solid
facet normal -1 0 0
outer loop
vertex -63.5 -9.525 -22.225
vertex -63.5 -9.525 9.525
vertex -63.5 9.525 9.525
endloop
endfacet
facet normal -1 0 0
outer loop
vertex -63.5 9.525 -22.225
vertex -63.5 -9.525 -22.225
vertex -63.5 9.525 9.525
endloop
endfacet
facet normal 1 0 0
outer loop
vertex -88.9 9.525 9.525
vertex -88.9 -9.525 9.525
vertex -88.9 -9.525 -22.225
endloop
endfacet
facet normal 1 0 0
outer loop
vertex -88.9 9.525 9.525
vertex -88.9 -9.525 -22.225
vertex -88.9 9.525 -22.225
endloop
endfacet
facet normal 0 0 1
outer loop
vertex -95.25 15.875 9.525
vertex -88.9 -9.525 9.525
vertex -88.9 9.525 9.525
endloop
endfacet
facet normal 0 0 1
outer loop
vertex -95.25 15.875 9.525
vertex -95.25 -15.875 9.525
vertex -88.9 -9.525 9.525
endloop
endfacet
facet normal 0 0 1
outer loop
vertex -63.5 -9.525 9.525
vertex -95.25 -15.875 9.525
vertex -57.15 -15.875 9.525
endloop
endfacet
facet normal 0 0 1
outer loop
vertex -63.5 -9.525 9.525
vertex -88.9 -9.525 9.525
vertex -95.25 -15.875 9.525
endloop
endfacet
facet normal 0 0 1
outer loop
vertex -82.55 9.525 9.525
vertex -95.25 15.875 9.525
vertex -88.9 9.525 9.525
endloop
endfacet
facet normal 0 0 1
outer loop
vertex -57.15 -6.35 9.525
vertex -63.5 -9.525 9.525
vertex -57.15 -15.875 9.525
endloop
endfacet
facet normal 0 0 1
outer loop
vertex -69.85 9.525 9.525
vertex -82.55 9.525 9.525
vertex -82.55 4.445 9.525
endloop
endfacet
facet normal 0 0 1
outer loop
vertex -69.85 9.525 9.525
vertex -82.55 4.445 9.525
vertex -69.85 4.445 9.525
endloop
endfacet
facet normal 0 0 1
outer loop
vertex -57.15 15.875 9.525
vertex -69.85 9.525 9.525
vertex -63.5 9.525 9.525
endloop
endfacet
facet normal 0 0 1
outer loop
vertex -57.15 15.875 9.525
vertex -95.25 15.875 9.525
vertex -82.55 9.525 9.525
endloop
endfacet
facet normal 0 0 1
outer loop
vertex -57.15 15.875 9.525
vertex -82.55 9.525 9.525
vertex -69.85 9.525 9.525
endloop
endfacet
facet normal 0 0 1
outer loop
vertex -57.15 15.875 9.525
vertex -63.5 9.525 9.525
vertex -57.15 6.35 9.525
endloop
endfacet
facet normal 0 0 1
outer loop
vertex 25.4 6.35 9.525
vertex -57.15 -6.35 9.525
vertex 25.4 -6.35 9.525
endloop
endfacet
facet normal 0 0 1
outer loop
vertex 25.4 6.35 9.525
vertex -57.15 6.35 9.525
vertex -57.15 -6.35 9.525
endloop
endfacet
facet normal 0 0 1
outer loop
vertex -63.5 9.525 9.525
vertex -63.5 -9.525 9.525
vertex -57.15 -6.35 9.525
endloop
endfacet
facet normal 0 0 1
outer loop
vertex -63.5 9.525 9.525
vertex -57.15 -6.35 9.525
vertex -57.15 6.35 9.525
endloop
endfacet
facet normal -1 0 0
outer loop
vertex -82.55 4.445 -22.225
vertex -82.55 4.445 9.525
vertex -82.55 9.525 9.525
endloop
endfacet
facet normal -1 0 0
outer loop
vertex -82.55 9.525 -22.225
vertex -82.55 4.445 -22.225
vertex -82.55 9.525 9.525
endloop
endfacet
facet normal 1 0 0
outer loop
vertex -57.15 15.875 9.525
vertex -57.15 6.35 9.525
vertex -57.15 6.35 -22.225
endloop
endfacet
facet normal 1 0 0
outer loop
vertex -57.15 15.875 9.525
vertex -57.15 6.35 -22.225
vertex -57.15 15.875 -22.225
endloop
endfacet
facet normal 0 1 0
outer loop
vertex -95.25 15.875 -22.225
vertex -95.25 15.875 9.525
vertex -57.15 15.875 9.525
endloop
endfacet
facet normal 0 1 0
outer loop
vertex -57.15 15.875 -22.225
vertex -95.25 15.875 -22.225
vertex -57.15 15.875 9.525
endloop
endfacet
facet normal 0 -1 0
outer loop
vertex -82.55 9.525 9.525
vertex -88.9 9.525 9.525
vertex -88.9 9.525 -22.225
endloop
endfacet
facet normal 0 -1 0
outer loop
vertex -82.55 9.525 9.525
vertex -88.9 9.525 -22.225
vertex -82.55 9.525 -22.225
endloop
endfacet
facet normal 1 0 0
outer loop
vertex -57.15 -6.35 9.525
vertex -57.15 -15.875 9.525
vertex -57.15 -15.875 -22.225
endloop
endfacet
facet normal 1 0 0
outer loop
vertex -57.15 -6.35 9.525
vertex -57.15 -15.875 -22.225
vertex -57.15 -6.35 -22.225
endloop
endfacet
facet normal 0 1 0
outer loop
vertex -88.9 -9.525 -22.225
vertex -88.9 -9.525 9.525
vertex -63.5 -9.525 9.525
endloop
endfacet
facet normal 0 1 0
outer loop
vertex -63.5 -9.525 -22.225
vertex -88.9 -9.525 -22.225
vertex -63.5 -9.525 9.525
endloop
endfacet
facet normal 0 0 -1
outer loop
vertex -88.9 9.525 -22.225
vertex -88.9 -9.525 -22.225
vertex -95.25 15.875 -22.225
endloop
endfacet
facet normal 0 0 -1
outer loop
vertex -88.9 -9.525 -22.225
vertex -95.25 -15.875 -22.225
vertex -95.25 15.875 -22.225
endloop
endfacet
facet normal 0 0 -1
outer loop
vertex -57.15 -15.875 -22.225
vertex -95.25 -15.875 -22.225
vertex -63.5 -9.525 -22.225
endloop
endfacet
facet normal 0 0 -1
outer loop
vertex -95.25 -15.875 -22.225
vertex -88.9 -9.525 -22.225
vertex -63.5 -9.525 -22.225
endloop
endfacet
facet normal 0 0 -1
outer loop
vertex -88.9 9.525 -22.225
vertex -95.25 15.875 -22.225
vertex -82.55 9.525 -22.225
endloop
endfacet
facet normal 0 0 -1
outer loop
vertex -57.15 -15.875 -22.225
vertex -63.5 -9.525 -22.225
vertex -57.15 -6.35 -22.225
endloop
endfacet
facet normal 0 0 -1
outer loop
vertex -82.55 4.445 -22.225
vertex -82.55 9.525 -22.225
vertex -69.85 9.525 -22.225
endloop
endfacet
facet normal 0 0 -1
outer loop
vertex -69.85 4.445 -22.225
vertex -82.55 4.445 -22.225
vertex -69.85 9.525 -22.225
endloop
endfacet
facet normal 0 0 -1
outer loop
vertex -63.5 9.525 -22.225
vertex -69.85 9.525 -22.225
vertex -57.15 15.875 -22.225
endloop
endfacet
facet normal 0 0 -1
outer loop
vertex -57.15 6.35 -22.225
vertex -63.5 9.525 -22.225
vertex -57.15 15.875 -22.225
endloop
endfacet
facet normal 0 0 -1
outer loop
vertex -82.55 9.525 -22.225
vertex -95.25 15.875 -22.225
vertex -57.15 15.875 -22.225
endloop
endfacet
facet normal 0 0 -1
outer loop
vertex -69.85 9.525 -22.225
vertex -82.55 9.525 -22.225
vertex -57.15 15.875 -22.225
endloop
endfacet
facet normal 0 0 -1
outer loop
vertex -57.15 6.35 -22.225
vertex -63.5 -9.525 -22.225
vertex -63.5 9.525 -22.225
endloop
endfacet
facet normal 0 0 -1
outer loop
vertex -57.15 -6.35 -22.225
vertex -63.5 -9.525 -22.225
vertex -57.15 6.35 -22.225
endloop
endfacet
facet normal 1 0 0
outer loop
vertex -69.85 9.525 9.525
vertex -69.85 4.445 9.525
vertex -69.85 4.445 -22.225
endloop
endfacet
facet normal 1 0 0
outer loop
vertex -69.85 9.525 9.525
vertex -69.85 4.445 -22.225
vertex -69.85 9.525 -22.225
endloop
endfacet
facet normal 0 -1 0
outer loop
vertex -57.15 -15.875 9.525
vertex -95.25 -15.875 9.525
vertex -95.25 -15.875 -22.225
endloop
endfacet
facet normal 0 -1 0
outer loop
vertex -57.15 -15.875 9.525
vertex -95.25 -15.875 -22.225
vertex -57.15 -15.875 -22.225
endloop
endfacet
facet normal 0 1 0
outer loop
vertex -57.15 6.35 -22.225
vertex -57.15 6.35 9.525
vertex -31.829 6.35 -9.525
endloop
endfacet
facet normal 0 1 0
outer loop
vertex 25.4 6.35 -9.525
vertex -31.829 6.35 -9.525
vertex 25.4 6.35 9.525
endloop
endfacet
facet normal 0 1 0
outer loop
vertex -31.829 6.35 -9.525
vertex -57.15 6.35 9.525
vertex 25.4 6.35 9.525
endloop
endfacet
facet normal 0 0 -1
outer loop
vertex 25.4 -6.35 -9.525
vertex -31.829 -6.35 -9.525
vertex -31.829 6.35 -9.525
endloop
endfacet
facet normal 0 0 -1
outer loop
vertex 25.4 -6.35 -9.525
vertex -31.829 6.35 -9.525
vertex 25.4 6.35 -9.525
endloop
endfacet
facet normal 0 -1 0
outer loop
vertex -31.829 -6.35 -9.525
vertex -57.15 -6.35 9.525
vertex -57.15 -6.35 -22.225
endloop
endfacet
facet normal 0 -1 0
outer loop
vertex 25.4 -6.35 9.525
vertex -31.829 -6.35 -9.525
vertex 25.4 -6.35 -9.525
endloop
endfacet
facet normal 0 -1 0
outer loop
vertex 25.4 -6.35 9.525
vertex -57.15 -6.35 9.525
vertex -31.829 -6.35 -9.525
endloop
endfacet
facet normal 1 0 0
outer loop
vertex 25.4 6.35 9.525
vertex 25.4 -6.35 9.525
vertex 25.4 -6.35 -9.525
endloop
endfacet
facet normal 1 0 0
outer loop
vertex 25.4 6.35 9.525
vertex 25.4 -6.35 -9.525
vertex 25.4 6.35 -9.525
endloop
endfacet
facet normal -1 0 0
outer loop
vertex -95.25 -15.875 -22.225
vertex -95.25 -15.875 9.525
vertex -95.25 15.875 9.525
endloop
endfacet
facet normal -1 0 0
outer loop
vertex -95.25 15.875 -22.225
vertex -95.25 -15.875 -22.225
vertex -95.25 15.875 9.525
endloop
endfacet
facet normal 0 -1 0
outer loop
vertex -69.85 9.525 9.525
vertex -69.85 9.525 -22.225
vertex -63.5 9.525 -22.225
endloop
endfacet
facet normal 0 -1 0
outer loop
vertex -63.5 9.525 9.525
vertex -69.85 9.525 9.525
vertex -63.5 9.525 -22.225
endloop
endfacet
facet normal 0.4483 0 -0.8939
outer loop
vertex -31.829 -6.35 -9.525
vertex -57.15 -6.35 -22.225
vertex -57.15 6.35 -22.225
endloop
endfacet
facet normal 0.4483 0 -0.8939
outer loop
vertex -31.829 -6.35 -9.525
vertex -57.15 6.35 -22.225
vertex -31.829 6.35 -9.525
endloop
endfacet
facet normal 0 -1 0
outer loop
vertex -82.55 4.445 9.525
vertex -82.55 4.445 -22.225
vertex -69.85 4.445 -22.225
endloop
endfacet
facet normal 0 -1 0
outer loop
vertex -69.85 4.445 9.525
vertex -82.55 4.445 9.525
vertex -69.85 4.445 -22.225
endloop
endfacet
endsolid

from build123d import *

# Parameters (mm, degrees)
F0_W      = 177.8
F0_H      = 19.05
F1_DEPTH  = 6.35
F2_W      = 38.1
F2_H      = 31.75
F2_W_2    = 25.4
F2_H_2    = 19.05
F3_DEPTH  = 31.75
F4_W      = 25.4
F4_H      = 19.05
F5_DEPTH  = 127
F6_W      = 12.7
F6_H      = 5.08
F7_DEPTH  = 31.75
F9_DEPTH  = 12.7
F10_W     = 63.5
F10_H     = 12.7
F11_DEPTH = 31.751


with BuildPart() as f1:
    # F0 (on Front) → F1 (new body, symmetric)
    with BuildSketch(Plane.XZ):
        Rectangle(F0_W, F0_H)
    extrude(amount=F1_DEPTH, both=True)

    # F2 (on face) → F3 (join)
    with BuildSketch(Plane.XY.offset(9.525)):
        with Locations((-76.2, 0)):
            Rectangle(F2_W, F2_H)
        with Locations((-76.2, 0)):
            Rectangle(F2_W_2, F2_H_2, mode=Mode.SUBTRACT)
    extrude(amount=-F3_DEPTH)

    # F4 (on face) → F5 (cut)
    with BuildSketch(Plane.XY.offset(9.525)):
        with Locations((-76.2, 0)):
            Rectangle(F4_W, F4_H)
    extrude(amount=-F5_DEPTH, mode=Mode.SUBTRACT)

    # F6 (on face) → F7 (join)
    with BuildSketch(Plane.XY.offset(9.525)):
        with Locations((-76.2, 6.985)):
            Rectangle(F6_W, F6_H)
    extrude(amount=-F7_DEPTH)

    # F8 (on face) → F9 (join)
    with BuildSketch(Plane.XZ.offset(6.35)):
        Polygon((-57.15, -22.225), (-31.829141, -9.525), (-57.15, -9.525), align=None)
    extrude(amount=-F9_DEPTH)

    # F10 (on face) → F11 (cut, through all)
    with BuildSketch(Plane.XY.offset(9.525)):
        with Locations((57.15, 0)):
            Rectangle(F10_W, F10_H)
    extrude(amount=-F11_DEPTH, mode=Mode.SUBTRACT)


solid = f1.part
